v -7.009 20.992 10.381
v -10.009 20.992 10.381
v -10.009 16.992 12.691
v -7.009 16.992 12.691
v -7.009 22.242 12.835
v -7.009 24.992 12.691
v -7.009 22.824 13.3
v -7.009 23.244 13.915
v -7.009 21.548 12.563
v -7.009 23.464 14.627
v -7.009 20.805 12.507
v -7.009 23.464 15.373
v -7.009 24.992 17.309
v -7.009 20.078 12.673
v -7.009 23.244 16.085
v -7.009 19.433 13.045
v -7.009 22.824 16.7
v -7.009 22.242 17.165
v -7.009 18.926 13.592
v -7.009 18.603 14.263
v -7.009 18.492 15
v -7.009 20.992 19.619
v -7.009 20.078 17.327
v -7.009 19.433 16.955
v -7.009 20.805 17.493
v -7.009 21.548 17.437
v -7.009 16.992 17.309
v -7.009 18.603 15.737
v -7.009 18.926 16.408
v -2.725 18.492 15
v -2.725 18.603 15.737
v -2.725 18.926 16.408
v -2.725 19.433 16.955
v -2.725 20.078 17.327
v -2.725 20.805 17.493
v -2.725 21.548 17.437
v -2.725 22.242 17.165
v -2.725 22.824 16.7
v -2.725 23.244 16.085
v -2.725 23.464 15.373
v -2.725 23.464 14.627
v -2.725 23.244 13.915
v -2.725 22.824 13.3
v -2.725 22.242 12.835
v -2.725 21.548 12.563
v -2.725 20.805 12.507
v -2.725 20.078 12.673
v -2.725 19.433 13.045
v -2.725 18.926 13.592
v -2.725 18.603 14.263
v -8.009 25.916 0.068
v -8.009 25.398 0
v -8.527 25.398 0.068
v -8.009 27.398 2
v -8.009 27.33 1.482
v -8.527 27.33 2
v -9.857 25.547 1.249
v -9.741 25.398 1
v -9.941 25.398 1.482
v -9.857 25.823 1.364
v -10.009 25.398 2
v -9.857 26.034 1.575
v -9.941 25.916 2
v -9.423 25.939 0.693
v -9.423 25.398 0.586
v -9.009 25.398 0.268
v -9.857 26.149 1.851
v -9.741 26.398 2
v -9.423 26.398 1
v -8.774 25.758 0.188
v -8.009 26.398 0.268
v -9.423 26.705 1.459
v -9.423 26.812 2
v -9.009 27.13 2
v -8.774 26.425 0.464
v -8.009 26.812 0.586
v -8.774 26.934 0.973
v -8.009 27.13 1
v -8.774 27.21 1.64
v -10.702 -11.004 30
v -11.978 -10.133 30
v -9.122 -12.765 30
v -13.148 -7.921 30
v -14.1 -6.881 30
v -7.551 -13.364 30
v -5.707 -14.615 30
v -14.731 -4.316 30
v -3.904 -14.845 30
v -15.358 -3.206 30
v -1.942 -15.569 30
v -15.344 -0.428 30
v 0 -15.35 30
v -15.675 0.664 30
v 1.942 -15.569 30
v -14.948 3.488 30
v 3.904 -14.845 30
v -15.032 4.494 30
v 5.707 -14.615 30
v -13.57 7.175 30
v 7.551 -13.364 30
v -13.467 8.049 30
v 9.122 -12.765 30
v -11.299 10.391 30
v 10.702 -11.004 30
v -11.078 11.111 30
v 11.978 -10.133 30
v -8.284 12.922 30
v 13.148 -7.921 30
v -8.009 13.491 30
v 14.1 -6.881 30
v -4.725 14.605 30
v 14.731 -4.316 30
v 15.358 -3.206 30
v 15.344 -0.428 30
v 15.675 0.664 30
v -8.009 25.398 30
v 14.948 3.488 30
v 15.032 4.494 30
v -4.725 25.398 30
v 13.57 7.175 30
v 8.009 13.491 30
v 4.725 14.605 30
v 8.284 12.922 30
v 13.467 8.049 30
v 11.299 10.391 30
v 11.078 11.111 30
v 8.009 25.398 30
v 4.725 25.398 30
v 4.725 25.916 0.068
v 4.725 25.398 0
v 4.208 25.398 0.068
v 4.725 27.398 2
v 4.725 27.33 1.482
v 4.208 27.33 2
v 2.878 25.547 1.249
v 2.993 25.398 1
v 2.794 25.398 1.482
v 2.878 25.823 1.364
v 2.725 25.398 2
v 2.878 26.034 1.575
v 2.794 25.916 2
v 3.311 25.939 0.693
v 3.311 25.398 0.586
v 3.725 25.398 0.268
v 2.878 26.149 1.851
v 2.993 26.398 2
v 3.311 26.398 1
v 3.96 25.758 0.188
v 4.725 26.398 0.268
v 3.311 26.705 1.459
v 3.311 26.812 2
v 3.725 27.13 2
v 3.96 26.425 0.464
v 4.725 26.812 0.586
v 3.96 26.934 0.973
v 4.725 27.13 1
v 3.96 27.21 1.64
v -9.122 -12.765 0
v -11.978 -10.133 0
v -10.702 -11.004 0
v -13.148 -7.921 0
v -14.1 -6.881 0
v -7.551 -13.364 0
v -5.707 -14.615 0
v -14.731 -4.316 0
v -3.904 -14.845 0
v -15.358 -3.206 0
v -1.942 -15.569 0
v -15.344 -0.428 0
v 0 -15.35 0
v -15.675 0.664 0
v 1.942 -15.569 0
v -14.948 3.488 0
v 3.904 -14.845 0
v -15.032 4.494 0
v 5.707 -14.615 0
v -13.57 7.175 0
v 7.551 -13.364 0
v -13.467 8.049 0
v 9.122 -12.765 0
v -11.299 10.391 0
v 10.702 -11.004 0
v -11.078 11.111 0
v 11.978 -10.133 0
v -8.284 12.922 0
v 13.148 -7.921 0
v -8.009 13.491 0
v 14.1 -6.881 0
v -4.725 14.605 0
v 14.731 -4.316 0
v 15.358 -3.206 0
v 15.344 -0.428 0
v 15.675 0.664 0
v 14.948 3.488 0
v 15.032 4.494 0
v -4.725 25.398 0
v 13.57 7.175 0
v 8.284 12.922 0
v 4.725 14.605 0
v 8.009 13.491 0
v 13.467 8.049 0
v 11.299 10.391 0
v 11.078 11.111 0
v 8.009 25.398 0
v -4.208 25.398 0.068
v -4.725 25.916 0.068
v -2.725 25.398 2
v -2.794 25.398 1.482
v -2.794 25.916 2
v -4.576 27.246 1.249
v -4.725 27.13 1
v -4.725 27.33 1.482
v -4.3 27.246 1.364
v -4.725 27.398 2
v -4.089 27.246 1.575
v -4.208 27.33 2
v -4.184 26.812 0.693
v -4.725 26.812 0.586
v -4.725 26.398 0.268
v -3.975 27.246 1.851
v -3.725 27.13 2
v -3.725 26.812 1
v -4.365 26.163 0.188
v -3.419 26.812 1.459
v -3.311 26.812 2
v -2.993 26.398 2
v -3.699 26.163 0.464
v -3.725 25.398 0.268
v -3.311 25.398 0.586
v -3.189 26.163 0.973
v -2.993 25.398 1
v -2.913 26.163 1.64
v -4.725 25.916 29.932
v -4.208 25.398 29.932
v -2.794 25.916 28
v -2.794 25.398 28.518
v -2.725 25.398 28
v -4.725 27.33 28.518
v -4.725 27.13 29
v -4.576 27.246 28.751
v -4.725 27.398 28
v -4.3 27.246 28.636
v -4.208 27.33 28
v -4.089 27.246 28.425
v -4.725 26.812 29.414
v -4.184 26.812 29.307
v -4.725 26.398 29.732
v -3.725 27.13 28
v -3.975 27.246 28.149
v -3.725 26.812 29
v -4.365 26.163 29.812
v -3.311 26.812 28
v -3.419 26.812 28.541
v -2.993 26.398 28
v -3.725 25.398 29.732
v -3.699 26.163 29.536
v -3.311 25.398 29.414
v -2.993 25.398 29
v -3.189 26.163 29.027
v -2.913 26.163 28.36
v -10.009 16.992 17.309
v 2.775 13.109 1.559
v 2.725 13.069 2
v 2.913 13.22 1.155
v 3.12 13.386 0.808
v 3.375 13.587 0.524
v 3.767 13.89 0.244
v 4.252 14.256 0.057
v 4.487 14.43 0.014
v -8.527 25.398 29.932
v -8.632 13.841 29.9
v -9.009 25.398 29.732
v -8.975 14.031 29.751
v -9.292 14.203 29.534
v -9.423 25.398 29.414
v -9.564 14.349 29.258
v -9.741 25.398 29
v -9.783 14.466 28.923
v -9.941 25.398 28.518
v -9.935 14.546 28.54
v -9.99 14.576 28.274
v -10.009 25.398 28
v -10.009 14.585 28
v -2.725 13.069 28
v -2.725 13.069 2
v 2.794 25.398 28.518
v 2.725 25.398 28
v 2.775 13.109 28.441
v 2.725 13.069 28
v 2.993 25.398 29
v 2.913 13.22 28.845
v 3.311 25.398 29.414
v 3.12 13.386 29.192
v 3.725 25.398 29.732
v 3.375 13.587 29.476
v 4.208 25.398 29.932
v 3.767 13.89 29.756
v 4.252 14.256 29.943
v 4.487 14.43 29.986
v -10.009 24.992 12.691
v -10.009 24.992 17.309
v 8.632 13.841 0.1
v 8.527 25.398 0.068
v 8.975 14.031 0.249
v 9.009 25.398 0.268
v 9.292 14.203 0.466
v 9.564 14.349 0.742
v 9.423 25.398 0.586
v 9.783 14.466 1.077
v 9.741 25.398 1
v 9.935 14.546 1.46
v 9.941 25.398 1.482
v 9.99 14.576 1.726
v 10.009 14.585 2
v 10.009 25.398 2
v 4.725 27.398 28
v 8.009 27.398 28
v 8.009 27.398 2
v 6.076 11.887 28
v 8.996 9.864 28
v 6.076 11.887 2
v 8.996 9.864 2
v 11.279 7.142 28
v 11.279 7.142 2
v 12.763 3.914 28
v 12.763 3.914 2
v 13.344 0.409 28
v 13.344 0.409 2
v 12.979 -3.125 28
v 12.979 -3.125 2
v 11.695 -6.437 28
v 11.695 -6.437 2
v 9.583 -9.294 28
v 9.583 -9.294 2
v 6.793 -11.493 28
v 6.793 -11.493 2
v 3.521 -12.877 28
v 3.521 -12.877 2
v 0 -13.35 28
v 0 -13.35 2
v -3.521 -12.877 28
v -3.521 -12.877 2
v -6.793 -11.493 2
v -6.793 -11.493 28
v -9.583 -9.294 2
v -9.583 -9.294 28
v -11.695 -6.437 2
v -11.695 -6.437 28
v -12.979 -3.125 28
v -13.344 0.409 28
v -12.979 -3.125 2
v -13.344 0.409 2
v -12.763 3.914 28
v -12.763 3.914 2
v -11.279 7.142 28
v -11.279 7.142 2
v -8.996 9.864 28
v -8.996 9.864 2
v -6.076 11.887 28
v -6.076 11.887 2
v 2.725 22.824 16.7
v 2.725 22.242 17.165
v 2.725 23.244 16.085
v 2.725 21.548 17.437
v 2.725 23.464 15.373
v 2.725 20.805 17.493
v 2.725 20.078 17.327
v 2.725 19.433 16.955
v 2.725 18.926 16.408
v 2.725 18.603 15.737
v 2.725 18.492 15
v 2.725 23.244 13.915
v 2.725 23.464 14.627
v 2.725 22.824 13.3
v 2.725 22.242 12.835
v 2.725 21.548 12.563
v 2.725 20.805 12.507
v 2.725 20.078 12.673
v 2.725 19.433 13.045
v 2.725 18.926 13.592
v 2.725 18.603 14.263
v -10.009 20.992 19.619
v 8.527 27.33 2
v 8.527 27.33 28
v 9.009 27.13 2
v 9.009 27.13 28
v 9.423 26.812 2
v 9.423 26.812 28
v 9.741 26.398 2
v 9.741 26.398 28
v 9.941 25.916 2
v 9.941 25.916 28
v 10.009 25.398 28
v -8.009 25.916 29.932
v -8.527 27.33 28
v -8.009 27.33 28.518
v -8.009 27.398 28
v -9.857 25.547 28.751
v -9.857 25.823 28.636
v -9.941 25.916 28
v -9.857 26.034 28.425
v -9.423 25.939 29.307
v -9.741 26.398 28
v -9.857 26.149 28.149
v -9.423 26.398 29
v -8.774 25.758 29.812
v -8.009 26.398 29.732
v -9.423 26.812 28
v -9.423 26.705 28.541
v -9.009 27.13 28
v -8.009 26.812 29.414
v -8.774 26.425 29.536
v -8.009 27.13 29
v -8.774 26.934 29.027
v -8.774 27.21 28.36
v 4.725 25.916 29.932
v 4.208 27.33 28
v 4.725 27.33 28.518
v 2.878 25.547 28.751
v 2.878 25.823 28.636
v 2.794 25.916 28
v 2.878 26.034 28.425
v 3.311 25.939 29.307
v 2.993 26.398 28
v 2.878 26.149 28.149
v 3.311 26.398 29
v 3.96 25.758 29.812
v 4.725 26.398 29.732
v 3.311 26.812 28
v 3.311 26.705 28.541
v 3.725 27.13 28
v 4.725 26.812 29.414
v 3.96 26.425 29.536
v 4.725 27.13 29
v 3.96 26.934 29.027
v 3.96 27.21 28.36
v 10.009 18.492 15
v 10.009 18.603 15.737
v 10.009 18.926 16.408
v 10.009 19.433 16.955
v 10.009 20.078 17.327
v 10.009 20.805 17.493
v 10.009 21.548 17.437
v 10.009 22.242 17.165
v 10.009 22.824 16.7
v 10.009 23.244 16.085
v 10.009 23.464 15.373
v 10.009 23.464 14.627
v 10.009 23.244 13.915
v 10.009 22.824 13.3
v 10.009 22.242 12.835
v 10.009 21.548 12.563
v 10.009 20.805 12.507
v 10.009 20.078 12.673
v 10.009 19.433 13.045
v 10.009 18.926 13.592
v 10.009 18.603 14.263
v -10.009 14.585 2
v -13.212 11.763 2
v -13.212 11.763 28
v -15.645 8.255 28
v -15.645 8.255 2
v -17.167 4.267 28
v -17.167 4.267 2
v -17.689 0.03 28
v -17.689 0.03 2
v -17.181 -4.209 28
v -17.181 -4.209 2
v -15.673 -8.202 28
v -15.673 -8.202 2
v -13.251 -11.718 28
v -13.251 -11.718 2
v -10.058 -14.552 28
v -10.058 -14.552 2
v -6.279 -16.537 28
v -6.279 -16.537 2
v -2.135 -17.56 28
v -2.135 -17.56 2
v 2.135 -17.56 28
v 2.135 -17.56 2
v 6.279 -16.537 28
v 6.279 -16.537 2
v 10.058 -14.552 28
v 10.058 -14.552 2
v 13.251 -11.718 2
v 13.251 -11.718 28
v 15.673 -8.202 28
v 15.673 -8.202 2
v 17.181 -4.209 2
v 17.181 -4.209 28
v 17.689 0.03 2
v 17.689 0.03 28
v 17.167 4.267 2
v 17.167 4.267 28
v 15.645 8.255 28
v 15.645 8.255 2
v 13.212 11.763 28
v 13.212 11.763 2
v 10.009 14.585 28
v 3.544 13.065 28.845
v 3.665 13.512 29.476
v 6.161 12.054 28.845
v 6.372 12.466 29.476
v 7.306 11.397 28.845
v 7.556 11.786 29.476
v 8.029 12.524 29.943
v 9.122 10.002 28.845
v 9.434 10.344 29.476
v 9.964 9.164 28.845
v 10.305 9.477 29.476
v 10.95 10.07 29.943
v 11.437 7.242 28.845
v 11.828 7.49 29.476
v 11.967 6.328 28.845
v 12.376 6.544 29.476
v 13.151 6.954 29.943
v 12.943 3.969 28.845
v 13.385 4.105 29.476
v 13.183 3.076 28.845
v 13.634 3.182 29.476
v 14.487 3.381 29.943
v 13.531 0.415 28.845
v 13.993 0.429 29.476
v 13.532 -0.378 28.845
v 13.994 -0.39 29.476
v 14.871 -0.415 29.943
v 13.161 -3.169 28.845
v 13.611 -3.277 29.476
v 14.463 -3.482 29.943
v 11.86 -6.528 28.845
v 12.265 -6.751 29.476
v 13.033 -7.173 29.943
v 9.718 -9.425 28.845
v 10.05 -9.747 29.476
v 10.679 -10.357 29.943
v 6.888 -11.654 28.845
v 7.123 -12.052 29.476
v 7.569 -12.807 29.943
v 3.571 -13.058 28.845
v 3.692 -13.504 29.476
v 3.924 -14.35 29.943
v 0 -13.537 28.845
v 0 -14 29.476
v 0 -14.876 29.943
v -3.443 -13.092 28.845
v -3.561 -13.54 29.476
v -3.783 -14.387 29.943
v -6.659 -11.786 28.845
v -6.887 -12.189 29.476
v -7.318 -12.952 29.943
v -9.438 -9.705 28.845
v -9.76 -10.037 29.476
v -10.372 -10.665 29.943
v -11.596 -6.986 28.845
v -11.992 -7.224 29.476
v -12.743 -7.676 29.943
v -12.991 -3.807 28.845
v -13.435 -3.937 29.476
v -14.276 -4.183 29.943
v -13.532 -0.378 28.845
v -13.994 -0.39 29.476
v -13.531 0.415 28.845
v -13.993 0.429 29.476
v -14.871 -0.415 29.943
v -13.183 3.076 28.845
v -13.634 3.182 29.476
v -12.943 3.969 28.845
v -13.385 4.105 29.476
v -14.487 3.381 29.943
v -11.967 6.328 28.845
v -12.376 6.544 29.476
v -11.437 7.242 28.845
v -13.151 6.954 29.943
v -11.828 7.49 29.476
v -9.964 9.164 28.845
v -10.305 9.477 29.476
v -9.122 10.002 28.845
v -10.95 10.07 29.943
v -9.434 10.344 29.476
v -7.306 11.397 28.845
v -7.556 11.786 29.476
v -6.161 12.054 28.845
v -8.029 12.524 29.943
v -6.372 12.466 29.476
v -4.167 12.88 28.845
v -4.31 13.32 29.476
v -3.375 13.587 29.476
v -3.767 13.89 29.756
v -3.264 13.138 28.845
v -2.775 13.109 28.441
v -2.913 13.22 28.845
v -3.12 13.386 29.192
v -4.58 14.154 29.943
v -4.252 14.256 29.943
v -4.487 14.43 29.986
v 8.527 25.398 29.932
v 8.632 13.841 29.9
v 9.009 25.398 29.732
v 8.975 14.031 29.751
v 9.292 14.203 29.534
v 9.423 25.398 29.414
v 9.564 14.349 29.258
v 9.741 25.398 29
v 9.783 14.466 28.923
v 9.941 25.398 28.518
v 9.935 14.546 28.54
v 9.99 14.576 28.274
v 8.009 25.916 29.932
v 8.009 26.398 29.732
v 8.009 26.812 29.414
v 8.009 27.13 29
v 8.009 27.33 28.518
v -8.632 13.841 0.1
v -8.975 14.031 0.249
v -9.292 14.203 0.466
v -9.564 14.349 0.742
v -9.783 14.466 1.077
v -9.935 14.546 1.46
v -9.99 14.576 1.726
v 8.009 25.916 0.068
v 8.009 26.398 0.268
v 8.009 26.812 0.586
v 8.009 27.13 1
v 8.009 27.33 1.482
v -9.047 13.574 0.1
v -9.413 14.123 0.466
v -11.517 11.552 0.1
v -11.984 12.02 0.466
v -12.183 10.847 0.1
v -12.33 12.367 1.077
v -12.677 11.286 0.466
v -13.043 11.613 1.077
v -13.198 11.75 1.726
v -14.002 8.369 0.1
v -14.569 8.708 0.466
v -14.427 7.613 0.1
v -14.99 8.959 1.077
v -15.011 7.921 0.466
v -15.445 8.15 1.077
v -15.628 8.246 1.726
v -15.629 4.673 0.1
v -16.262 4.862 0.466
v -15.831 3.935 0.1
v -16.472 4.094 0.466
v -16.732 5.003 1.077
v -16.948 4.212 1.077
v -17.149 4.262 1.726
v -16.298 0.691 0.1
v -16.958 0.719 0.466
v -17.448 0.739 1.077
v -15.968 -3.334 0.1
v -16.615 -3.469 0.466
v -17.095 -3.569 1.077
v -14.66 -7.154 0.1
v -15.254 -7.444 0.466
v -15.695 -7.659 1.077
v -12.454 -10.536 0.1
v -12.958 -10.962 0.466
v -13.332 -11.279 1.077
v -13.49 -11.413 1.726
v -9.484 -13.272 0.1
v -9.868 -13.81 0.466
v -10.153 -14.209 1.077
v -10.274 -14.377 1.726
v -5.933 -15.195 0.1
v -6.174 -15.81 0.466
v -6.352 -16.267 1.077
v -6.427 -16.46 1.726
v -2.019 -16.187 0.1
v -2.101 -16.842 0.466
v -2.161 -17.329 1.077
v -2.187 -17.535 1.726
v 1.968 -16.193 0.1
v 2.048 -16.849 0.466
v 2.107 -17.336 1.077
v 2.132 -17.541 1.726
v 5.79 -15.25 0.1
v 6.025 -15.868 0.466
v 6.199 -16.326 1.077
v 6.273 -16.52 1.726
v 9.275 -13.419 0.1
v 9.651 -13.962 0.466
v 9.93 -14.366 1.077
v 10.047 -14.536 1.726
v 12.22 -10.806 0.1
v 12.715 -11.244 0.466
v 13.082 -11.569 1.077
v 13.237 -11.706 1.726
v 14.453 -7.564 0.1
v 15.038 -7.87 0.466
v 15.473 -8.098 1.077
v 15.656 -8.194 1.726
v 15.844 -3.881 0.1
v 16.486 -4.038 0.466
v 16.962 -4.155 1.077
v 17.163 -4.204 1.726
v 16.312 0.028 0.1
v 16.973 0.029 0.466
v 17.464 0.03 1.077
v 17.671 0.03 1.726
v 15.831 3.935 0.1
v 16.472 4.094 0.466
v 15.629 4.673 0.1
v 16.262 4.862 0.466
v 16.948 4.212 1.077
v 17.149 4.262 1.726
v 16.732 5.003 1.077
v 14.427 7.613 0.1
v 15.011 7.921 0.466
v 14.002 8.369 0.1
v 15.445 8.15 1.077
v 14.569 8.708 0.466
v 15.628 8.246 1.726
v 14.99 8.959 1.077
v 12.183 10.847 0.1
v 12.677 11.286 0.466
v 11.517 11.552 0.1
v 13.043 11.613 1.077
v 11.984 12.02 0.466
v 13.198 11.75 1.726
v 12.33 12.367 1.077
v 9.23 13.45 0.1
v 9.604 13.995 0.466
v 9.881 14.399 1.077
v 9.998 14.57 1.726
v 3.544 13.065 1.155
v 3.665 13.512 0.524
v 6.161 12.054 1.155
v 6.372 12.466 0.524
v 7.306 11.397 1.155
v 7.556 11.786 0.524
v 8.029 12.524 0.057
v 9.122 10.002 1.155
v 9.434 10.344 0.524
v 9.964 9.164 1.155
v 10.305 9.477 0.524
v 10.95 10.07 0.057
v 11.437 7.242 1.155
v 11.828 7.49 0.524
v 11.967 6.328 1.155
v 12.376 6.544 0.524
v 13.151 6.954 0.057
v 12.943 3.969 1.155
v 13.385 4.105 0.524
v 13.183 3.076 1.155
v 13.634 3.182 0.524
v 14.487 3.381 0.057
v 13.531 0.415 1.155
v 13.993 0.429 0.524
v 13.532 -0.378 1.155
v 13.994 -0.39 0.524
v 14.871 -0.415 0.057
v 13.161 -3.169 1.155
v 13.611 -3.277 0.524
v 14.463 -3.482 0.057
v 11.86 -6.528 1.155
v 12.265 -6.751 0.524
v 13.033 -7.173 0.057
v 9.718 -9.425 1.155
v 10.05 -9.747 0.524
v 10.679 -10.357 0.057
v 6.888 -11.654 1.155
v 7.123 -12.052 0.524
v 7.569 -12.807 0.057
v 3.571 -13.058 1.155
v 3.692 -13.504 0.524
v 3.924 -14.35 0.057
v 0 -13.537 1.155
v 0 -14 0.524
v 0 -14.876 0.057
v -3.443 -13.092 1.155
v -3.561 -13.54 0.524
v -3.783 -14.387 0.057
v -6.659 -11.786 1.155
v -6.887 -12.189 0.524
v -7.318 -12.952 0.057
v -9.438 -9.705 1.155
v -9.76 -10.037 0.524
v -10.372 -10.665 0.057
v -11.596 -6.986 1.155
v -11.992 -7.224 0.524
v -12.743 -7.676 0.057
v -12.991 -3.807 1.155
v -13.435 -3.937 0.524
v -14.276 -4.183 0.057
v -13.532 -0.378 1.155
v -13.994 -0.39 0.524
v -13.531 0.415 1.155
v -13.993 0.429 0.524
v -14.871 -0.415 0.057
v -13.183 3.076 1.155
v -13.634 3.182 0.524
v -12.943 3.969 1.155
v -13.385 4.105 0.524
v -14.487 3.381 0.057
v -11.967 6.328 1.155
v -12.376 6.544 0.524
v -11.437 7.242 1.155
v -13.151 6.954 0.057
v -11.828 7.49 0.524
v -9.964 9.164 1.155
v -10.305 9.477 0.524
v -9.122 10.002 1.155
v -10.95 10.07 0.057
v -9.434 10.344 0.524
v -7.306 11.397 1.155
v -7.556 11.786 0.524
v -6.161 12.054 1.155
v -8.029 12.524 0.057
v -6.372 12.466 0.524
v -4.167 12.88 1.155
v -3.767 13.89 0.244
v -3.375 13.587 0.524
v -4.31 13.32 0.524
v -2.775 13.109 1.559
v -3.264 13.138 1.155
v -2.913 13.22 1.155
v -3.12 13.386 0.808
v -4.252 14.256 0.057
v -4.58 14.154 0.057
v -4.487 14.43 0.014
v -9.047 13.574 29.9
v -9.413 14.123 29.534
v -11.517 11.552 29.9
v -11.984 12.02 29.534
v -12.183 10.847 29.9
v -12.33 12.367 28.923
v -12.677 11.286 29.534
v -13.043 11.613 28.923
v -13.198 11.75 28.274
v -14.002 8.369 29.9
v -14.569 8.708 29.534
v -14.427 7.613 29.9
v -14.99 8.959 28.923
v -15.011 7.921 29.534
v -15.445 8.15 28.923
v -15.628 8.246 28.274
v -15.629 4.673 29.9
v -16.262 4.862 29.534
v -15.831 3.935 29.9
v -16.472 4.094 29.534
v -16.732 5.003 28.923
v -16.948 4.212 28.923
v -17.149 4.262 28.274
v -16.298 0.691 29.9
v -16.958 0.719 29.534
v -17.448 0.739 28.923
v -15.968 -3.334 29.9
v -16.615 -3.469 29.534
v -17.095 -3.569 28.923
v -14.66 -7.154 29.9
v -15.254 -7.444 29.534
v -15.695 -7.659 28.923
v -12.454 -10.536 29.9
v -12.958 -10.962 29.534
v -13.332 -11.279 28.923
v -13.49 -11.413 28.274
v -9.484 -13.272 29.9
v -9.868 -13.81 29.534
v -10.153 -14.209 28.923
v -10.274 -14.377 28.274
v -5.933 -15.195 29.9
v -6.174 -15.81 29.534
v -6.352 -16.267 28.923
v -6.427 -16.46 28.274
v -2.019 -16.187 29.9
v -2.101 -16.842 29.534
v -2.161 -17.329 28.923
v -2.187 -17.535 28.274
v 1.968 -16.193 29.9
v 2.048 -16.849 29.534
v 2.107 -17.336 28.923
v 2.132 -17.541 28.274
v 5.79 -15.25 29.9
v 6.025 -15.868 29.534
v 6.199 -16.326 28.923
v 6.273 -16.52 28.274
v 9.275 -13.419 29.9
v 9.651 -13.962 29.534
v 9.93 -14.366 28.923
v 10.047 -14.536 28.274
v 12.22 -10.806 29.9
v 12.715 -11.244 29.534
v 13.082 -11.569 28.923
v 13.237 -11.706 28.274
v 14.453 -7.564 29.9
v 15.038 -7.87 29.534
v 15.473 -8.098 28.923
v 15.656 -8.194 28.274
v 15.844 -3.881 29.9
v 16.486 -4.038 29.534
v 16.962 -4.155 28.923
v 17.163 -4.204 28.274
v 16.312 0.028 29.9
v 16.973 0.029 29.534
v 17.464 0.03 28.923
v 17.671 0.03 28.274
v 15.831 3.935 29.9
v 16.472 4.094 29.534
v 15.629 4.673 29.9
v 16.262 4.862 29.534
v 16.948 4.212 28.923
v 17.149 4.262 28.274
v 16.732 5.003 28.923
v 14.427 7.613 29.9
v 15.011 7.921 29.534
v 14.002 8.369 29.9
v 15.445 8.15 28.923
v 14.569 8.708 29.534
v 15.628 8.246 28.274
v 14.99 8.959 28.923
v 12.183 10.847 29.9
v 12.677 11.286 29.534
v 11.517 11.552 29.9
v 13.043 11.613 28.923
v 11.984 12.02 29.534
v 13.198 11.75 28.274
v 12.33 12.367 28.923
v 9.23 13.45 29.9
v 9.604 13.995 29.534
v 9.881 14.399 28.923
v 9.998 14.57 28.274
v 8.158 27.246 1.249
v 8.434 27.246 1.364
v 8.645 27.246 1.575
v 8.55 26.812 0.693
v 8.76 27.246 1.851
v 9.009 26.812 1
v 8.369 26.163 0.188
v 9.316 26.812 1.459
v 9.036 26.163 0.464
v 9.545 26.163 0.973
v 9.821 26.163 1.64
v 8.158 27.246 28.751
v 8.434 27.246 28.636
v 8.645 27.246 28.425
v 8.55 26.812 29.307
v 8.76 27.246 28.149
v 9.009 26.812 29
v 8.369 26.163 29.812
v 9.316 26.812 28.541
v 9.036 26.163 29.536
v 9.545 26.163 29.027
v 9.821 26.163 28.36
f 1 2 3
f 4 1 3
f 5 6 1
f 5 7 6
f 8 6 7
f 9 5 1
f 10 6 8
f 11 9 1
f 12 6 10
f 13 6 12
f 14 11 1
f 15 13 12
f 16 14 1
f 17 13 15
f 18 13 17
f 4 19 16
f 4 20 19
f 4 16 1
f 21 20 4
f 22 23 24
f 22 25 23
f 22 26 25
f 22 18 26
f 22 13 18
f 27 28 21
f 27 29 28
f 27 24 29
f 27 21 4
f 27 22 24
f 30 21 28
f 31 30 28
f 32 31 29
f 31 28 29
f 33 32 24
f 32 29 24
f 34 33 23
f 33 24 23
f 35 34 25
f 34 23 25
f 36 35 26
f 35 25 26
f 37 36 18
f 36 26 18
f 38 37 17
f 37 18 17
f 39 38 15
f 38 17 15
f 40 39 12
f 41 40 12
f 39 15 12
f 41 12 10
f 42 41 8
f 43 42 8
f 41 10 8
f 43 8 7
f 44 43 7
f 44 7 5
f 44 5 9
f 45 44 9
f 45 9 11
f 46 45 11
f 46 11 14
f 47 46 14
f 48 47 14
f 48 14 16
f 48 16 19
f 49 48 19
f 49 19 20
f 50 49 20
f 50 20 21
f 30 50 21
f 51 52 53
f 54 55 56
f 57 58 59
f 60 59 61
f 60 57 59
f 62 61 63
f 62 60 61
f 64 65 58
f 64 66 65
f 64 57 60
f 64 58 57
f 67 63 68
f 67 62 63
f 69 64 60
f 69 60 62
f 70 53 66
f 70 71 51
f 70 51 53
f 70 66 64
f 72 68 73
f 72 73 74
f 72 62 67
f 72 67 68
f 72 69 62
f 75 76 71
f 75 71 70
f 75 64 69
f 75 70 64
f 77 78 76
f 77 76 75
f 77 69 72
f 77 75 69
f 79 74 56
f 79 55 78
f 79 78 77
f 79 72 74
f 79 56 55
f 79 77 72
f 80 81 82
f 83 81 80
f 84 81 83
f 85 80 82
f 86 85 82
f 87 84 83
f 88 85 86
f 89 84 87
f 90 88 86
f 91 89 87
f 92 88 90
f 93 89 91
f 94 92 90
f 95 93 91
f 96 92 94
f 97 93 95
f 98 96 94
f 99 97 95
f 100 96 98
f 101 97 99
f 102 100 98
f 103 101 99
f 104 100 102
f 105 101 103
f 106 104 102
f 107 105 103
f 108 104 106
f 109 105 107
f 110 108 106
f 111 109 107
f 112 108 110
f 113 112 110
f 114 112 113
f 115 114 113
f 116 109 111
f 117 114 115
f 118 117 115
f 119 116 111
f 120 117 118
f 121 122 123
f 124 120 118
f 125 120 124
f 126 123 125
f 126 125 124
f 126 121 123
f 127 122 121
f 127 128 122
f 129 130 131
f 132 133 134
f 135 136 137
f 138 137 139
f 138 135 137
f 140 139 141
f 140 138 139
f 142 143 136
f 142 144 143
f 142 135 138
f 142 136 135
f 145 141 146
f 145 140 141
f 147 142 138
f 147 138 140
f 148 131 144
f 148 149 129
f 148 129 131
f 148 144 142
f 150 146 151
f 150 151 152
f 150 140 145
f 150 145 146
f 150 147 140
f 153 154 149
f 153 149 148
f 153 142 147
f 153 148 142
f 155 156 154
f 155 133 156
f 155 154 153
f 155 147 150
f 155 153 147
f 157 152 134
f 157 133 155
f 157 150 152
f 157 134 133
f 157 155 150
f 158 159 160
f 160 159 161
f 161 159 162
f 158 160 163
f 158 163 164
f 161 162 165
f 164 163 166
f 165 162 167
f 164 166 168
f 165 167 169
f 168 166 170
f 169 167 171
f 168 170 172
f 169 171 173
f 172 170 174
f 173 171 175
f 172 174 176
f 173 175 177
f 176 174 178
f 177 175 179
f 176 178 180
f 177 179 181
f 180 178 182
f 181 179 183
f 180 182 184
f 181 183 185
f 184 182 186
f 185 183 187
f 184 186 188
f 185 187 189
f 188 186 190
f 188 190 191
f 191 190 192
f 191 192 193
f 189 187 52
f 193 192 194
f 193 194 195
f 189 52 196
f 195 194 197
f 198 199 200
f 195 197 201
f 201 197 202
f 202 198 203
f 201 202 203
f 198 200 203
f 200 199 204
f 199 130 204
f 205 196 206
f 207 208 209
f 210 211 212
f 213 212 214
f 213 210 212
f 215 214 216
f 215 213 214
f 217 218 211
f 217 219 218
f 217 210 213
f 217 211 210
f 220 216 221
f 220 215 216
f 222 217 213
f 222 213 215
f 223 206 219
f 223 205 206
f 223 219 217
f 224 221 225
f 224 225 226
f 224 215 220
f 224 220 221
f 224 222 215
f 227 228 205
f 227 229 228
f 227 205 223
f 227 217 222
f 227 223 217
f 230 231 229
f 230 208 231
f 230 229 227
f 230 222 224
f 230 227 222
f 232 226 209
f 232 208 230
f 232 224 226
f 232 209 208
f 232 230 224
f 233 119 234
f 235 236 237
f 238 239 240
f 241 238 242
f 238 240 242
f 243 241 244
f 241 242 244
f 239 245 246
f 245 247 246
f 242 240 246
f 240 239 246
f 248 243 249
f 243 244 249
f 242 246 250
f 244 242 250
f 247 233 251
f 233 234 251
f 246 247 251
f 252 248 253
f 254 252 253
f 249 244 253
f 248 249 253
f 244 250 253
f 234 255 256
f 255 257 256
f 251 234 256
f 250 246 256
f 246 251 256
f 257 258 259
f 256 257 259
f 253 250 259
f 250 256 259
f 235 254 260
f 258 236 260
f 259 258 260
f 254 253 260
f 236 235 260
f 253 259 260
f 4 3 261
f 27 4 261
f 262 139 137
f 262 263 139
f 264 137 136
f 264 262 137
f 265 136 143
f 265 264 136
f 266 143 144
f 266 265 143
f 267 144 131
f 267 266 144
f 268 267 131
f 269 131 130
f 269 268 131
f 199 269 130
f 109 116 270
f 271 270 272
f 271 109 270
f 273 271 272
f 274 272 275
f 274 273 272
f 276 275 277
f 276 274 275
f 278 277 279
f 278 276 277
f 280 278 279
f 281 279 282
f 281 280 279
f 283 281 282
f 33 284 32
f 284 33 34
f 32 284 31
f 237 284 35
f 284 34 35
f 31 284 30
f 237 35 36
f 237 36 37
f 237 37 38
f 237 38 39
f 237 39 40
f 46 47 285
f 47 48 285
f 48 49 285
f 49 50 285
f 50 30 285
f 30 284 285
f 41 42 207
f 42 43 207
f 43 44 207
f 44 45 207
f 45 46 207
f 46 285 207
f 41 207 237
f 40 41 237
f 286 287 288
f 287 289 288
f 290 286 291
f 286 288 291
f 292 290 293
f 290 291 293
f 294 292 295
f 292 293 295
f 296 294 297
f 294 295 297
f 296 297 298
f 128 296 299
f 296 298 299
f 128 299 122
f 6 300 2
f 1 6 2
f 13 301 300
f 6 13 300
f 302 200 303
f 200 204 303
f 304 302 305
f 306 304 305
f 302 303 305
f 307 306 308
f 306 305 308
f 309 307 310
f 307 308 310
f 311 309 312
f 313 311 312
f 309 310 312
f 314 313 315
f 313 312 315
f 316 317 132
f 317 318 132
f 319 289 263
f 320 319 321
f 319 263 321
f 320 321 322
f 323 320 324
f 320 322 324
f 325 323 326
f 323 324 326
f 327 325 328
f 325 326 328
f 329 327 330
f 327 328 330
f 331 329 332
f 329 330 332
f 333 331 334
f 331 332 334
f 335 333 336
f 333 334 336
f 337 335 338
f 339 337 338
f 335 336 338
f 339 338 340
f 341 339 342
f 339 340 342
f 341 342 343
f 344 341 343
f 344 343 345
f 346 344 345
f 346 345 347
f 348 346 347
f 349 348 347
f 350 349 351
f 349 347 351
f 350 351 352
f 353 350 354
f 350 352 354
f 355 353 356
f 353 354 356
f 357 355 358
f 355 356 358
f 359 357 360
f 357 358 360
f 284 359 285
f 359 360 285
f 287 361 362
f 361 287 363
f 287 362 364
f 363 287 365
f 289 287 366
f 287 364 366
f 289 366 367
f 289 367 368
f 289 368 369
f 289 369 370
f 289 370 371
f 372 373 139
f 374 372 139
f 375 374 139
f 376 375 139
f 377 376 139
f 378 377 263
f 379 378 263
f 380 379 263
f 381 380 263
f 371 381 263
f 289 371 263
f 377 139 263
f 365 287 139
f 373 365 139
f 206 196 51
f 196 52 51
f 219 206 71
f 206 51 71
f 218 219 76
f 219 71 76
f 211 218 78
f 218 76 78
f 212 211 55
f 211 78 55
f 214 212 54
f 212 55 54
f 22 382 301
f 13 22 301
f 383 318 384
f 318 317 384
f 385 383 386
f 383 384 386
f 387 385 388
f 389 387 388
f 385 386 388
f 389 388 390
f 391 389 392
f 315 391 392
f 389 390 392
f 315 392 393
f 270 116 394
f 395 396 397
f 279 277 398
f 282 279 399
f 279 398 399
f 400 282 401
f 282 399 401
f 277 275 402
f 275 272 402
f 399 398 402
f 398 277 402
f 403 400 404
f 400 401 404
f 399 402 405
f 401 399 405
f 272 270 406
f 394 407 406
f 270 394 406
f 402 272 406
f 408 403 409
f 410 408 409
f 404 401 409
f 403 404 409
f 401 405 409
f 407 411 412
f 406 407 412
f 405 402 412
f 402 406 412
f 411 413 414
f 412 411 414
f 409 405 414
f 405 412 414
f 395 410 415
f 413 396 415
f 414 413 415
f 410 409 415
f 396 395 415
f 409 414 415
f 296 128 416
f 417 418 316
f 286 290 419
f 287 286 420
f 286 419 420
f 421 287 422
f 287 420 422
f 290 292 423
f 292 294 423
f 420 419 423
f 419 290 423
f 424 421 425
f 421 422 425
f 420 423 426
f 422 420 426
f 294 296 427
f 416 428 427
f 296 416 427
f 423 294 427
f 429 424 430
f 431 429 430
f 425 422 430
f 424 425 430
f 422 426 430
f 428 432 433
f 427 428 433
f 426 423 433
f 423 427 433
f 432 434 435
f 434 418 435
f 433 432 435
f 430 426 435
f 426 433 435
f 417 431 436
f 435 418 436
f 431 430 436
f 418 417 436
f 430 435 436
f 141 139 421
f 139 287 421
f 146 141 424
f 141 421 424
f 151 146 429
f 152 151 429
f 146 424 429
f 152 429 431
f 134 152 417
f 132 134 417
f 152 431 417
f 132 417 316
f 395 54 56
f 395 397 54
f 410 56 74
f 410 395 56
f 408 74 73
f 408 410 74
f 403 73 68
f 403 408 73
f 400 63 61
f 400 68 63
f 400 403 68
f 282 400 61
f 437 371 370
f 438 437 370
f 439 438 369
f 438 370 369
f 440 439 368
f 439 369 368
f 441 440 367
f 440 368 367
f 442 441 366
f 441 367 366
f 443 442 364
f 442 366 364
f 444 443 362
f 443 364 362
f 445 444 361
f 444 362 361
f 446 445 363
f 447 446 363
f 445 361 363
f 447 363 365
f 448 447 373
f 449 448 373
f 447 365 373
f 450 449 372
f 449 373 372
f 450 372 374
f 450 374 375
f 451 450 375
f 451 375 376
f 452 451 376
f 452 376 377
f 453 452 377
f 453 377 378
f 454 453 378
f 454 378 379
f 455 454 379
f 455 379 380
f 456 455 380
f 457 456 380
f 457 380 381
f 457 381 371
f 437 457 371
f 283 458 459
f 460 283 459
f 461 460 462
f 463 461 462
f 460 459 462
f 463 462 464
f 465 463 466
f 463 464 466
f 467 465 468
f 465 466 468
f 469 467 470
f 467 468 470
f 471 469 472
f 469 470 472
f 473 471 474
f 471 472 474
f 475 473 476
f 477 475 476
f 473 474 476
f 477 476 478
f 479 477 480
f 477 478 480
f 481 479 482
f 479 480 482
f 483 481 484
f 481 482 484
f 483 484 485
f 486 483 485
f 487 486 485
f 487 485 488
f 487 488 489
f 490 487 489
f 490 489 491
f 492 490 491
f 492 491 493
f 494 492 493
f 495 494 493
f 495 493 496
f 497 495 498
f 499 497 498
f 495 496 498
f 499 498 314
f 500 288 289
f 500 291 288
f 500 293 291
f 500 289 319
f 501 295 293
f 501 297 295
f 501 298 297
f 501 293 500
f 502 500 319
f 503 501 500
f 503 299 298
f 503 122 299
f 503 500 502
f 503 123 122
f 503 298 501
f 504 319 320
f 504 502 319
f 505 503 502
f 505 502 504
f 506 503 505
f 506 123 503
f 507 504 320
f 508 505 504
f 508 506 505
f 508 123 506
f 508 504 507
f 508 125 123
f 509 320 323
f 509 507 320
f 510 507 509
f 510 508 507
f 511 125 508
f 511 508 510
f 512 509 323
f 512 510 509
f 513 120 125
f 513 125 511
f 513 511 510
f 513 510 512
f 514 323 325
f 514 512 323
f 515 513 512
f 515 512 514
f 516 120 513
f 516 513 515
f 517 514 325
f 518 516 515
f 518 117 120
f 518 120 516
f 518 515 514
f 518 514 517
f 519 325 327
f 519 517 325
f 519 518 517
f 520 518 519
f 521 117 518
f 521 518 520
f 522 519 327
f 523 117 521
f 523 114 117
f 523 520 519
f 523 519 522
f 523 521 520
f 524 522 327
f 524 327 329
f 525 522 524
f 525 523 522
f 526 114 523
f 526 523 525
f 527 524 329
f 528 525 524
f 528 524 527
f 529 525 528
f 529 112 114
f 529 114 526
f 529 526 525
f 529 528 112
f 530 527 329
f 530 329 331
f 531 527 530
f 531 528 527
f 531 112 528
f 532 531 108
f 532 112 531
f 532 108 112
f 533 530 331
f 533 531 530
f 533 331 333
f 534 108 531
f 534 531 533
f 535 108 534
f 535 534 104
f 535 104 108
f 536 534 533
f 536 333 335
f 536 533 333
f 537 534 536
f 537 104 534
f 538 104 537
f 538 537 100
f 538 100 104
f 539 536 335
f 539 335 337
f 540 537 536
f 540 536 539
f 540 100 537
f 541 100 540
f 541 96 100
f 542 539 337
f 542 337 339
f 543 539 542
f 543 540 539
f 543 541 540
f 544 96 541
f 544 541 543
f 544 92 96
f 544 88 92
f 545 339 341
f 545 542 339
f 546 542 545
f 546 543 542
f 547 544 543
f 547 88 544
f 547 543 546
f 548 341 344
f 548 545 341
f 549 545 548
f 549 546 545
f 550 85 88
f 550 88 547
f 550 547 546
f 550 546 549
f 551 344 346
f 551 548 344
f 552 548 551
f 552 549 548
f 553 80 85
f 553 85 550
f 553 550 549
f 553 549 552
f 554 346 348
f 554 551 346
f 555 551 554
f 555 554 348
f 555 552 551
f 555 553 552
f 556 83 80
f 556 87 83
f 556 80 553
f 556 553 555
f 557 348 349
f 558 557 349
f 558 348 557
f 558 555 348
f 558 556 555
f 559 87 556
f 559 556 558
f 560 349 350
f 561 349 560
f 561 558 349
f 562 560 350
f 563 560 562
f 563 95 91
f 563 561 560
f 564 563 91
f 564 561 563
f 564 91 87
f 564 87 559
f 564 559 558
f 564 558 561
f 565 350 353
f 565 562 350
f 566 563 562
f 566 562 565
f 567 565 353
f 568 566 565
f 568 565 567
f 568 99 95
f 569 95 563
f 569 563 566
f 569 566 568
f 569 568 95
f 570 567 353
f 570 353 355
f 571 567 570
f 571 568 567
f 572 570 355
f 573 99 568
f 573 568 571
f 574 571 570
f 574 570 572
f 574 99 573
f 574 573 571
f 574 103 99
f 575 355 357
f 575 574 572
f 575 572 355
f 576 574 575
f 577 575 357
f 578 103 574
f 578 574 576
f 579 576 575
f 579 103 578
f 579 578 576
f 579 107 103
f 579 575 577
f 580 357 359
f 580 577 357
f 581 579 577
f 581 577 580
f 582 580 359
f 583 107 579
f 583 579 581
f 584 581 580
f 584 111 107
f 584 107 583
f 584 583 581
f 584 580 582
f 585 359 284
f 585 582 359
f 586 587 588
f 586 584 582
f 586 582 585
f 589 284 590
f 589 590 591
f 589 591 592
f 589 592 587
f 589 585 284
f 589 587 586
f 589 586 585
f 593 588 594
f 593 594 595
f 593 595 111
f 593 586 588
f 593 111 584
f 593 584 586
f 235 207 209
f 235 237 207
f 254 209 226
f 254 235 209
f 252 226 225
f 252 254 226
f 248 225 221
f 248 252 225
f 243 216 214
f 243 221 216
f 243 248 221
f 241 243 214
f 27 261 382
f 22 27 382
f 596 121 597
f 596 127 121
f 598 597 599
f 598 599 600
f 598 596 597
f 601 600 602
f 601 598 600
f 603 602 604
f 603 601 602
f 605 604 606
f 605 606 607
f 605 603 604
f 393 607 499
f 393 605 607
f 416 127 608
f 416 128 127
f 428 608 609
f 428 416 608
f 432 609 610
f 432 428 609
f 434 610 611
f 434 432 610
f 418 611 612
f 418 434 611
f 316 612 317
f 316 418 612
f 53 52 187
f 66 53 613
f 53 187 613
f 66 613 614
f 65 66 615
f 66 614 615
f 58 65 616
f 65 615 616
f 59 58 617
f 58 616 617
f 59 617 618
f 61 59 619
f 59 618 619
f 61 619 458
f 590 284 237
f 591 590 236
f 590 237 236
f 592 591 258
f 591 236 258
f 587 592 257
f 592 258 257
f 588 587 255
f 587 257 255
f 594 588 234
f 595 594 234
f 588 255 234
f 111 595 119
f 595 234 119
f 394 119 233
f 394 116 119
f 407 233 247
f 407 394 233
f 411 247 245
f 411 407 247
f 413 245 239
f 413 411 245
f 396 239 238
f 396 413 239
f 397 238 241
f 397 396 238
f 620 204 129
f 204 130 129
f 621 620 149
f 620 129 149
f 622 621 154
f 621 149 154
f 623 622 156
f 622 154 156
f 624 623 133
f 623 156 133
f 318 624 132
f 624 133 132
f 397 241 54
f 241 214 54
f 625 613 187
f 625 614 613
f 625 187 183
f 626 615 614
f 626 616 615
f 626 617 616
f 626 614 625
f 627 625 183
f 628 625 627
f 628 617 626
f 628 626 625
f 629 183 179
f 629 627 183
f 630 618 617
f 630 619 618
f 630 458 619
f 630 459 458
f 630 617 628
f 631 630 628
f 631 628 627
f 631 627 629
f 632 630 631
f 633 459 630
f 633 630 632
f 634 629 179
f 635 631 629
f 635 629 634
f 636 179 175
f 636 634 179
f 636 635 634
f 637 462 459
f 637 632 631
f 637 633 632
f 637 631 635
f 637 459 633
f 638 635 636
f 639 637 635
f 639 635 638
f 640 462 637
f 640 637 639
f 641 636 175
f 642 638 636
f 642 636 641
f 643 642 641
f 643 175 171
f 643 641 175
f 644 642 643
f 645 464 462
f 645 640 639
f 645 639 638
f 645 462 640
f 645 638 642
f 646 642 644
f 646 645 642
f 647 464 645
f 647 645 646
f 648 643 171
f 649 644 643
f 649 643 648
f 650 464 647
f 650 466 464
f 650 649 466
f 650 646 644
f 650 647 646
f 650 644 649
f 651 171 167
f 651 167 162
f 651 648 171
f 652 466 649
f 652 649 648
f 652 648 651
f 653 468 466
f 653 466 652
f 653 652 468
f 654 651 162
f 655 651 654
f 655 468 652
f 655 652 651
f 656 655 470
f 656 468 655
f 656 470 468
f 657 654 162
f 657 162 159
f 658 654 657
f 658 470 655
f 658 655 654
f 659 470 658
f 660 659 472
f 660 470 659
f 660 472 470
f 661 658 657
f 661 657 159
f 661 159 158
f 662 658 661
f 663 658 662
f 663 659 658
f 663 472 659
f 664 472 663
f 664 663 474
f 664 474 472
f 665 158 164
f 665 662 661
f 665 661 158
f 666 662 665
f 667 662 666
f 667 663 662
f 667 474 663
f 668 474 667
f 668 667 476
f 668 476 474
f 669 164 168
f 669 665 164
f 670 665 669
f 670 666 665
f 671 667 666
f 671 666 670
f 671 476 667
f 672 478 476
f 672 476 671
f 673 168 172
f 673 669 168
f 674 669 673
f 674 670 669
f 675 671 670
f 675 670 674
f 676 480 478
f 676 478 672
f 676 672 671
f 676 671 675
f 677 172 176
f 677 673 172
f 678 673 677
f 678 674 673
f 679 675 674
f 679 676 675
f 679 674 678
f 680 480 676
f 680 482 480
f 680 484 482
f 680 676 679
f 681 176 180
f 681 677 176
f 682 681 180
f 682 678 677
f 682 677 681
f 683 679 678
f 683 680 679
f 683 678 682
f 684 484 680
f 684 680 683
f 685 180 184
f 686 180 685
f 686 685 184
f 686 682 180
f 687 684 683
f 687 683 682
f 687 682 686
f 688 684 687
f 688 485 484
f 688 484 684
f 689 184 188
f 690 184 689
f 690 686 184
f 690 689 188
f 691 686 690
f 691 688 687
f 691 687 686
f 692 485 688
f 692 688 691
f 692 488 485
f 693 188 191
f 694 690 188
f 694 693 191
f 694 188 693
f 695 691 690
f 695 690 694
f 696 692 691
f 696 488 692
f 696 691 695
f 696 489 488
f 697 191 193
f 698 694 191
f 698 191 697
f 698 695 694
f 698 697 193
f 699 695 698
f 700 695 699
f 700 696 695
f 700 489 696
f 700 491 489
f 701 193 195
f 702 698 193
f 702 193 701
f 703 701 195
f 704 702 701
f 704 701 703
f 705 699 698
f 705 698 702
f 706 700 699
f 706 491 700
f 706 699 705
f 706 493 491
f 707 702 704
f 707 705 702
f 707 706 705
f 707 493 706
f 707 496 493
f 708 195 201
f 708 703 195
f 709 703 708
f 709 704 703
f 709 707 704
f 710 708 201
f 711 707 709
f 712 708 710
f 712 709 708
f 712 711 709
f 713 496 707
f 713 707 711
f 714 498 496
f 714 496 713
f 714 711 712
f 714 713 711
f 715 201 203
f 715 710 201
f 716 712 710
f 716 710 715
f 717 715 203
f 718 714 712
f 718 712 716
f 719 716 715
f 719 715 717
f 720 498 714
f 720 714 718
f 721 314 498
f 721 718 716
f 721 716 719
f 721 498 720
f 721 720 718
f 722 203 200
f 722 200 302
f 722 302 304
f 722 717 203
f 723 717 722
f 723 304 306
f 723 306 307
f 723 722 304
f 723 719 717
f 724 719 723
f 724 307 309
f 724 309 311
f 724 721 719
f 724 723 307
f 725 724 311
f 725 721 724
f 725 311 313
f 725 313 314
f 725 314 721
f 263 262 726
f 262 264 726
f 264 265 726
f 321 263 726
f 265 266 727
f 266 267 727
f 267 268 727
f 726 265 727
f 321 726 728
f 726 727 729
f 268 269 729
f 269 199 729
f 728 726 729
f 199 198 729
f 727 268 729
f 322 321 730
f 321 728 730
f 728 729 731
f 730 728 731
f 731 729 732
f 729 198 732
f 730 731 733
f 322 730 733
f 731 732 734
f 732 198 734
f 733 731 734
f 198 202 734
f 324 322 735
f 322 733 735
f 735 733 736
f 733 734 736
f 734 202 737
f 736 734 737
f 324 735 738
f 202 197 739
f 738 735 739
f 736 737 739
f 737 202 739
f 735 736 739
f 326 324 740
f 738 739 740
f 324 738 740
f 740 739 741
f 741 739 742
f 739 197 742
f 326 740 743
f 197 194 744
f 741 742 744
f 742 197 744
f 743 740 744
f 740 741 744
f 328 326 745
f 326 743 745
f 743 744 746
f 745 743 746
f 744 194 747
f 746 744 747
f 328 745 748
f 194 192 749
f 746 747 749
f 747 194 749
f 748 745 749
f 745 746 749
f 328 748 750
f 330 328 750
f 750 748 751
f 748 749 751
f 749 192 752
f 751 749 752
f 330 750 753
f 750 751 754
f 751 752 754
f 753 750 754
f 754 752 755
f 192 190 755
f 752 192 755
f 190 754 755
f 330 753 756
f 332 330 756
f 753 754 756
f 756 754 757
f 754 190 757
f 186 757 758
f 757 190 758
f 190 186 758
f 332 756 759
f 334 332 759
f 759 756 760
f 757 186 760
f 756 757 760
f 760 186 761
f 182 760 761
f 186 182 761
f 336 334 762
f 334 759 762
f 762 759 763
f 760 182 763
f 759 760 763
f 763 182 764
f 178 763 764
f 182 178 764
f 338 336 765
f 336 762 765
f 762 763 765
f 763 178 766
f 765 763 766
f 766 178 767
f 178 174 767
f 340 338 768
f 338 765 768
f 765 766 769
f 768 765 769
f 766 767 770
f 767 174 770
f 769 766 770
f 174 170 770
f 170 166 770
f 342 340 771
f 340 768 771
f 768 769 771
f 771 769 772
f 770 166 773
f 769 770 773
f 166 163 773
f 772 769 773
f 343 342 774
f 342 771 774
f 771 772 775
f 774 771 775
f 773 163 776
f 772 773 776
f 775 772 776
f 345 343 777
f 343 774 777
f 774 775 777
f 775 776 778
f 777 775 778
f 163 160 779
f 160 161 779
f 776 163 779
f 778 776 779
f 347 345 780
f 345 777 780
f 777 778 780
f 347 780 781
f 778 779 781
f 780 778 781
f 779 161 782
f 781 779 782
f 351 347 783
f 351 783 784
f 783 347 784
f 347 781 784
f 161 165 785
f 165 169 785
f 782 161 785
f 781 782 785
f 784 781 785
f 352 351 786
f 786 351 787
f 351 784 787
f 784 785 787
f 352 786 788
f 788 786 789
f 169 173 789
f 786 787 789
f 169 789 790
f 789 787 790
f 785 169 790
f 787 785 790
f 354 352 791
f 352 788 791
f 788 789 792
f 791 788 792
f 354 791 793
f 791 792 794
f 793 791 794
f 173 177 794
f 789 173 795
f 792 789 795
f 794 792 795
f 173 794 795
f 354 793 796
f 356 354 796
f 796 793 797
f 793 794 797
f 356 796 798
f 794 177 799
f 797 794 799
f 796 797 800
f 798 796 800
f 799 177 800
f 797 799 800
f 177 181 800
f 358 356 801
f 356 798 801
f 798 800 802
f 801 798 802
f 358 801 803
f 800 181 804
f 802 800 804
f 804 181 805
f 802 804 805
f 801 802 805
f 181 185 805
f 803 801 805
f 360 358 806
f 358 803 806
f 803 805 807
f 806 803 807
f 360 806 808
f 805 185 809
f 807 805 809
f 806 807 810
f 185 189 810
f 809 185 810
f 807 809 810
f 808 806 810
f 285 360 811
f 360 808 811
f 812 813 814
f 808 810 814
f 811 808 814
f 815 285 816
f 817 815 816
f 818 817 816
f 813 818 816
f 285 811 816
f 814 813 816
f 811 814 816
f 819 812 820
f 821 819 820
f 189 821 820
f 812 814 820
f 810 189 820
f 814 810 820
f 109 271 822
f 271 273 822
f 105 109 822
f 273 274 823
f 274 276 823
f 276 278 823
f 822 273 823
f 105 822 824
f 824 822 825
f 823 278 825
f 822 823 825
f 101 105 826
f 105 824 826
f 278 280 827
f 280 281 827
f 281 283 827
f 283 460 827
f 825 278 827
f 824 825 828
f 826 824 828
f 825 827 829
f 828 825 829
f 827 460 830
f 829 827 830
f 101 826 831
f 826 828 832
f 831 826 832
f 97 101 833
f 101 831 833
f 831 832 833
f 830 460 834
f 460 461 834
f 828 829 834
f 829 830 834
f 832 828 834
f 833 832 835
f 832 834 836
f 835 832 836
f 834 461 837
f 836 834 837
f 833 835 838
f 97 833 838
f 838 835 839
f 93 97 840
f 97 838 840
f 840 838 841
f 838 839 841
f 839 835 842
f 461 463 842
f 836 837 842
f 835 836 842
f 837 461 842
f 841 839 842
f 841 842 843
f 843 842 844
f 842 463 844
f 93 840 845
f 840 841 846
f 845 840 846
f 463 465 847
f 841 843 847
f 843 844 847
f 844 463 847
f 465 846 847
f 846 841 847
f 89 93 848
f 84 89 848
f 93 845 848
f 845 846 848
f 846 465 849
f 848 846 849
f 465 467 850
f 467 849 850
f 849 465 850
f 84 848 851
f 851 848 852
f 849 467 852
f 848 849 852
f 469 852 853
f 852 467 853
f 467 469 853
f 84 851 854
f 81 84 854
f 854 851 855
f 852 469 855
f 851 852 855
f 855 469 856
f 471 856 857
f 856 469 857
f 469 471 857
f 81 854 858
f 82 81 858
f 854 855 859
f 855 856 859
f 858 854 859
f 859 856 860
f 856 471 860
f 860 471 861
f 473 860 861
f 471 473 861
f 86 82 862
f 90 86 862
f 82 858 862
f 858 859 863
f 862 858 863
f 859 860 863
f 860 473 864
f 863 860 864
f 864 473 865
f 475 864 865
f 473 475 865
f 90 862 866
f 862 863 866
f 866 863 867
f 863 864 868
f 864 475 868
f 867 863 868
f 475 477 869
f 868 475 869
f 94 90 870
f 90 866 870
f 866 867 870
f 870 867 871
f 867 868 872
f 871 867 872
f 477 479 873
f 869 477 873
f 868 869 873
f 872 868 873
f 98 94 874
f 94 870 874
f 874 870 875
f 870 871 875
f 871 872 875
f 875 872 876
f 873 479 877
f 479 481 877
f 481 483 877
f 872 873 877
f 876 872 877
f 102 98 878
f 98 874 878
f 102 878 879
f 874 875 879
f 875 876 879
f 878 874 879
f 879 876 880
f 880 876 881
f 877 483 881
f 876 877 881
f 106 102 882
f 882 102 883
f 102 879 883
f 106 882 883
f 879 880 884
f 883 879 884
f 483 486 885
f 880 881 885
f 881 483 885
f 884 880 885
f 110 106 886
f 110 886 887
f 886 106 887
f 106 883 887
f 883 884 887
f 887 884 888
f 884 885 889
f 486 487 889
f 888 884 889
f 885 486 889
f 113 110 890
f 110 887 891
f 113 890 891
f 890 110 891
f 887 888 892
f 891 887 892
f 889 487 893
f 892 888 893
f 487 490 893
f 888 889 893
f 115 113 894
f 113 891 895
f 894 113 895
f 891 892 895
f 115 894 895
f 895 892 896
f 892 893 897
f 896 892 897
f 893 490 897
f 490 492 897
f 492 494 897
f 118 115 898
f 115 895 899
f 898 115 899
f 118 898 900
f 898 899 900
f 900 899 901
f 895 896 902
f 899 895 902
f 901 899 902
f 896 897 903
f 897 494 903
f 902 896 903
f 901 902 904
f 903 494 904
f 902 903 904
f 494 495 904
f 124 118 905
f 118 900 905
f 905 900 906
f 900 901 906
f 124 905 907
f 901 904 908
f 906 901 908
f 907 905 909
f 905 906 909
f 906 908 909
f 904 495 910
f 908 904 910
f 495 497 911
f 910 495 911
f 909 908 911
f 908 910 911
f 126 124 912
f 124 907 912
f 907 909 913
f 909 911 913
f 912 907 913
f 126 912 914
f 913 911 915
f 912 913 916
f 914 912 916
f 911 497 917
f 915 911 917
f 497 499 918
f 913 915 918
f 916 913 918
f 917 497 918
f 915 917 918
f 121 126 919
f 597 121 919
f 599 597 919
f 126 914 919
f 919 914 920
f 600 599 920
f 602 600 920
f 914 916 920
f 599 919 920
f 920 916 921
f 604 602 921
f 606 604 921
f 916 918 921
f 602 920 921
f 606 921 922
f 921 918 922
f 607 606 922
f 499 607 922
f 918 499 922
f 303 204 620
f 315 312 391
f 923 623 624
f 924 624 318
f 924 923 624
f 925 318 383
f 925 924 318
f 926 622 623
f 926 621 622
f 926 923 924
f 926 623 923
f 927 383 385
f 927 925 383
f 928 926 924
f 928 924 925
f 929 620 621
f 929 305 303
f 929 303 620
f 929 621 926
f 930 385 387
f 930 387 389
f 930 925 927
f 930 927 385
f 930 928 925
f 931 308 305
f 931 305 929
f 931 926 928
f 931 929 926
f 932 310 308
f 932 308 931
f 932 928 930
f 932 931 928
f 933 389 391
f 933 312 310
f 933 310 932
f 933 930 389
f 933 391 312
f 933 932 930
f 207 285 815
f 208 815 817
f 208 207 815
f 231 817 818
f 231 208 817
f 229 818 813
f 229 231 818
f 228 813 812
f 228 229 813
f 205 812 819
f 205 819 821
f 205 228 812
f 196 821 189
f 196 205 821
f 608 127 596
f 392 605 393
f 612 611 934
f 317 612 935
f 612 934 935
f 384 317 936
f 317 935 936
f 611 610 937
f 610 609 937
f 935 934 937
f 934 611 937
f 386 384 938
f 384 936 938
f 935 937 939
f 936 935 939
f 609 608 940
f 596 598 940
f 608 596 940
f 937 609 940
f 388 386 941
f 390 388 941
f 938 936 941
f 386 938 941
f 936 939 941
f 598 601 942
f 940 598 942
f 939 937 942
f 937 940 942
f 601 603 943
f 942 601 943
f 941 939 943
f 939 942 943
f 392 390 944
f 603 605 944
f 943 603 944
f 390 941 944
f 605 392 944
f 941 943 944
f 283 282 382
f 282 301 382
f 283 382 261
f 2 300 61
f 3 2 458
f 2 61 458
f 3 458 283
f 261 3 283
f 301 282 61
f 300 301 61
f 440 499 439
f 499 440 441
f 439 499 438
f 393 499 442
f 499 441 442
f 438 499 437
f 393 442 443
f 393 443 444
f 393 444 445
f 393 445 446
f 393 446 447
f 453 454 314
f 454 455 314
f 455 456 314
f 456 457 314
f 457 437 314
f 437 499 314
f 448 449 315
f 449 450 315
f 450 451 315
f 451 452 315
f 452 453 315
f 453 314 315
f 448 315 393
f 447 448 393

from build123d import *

# Parameters (mm, degrees)
F1_DEPTH = 30
F2_R     = 2.5
F3_DEPTH = 27.699377
F5_DEPTH = 3
F6_R     = 2


with BuildPart() as f1:
    # F0 (on Top) → F1 (new body)
    with BuildSketch(Plane.XY):
        with BuildLine():
            ThreePointArc((2.72548, 13.068828), (0, -13.35), (-2.72548, 13.068828))
            Line((-2.72548, 13.068828), (-2.72548, 17.478191))
            ThreePointArc((-2.72548, 17.478191), (-6.52943, 16.440254), (-10.008962, 14.585476))
            ThreePointArc((-10.008962, 14.585476), (0, -17.689415), (10.008962, 14.585476))
            ThreePointArc((10.008962, 14.585476), (6.52943, 16.440254), (2.72548, 17.478191))
            Line((2.72548, 17.478191), (2.72548, 13.068828))
        make_face()
        with BuildLine():
            ThreePointArc((-10.008962, 14.585476), (-6.52943, 16.440254), (-2.72548, 17.478191))
            Line((-2.72548, 17.478191), (-2.72548, 27.397981))
            Line((-2.72548, 27.397981), (-10.008962, 27.397981))
            Line((-10.008962, 27.397981), (-10.008962, 14.585476))
        make_face()
        with BuildLine():
            Line((2.72548, 27.397981), (2.72548, 17.478191))
            ThreePointArc((2.72548, 17.478191), (6.52943, 16.440254), (10.008962, 14.585476))
            Line((10.008962, 14.585476), (10.008962, 27.397981))
            Line((10.008962, 27.397981), (2.72548, 27.397981))
        make_face()
    extrude(amount=F1_DEPTH)

    # F2 (on face) → F3 (cut, through all)
    with BuildSketch(Plane(origin=(-10.008962, 0, 0), x_dir=(0, -1, 0), z_dir=(-1, 0, 0))):
        with Locations((-20.991728, 15)):
            Circle(F2_R)
    extrude(amount=-F3_DEPTH, mode=Mode.SUBTRACT)

    # F4 (on face) → F5 (cut)
    with BuildSketch(Plane(origin=(-10.008962, 0, 0), x_dir=(0, -1, 0), z_dir=(-1, 0, 0))):
        Polygon((-24.991728, 17.309401), (-24.991728, 12.690599), (-20.991728, 10.381198), (-16.991728, 12.690599), (-16.991728, 17.309401), (-20.991728, 19.618802), align=None)
    extrude(amount=-F5_DEPTH, mode=Mode.SUBTRACT)

    # F6
    f6_edges = [f1.edges().sort_by_distance(p)[0] for p in [
        (0, -13.35, 30),
        (-2.72548, 20.233404, 30),
        (-6.367221, 27.397981, 30),
        (-10.008962, 20.991728, 30),
        (0, -17.689415, 30),
        (10.008962, 20.991728, 30),
        (6.367221, 27.397981, 30),
        (2.72548, 20.233404, 30),
        (0, -13.35, 0),
        (-2.72548, 20.233404, 0),
        (-6.367221, 27.397981, 0),
        (-10.008962, 20.991728, 0),
        (0, -17.689415, 0),
        (10.008962, 20.991728, 0),
        (6.367221, 27.397981, 0),
        (2.72548, 20.233404, 0),
        (10.008962, 27.397981, 15),
        (2.72548, 27.397981, 15),
        (-2.72548, 27.397981, 15),
        (-10.008962, 27.397981, 15),
    ]]
    fillet(f6_edges, radius=F6_R)


solid = f1.part
